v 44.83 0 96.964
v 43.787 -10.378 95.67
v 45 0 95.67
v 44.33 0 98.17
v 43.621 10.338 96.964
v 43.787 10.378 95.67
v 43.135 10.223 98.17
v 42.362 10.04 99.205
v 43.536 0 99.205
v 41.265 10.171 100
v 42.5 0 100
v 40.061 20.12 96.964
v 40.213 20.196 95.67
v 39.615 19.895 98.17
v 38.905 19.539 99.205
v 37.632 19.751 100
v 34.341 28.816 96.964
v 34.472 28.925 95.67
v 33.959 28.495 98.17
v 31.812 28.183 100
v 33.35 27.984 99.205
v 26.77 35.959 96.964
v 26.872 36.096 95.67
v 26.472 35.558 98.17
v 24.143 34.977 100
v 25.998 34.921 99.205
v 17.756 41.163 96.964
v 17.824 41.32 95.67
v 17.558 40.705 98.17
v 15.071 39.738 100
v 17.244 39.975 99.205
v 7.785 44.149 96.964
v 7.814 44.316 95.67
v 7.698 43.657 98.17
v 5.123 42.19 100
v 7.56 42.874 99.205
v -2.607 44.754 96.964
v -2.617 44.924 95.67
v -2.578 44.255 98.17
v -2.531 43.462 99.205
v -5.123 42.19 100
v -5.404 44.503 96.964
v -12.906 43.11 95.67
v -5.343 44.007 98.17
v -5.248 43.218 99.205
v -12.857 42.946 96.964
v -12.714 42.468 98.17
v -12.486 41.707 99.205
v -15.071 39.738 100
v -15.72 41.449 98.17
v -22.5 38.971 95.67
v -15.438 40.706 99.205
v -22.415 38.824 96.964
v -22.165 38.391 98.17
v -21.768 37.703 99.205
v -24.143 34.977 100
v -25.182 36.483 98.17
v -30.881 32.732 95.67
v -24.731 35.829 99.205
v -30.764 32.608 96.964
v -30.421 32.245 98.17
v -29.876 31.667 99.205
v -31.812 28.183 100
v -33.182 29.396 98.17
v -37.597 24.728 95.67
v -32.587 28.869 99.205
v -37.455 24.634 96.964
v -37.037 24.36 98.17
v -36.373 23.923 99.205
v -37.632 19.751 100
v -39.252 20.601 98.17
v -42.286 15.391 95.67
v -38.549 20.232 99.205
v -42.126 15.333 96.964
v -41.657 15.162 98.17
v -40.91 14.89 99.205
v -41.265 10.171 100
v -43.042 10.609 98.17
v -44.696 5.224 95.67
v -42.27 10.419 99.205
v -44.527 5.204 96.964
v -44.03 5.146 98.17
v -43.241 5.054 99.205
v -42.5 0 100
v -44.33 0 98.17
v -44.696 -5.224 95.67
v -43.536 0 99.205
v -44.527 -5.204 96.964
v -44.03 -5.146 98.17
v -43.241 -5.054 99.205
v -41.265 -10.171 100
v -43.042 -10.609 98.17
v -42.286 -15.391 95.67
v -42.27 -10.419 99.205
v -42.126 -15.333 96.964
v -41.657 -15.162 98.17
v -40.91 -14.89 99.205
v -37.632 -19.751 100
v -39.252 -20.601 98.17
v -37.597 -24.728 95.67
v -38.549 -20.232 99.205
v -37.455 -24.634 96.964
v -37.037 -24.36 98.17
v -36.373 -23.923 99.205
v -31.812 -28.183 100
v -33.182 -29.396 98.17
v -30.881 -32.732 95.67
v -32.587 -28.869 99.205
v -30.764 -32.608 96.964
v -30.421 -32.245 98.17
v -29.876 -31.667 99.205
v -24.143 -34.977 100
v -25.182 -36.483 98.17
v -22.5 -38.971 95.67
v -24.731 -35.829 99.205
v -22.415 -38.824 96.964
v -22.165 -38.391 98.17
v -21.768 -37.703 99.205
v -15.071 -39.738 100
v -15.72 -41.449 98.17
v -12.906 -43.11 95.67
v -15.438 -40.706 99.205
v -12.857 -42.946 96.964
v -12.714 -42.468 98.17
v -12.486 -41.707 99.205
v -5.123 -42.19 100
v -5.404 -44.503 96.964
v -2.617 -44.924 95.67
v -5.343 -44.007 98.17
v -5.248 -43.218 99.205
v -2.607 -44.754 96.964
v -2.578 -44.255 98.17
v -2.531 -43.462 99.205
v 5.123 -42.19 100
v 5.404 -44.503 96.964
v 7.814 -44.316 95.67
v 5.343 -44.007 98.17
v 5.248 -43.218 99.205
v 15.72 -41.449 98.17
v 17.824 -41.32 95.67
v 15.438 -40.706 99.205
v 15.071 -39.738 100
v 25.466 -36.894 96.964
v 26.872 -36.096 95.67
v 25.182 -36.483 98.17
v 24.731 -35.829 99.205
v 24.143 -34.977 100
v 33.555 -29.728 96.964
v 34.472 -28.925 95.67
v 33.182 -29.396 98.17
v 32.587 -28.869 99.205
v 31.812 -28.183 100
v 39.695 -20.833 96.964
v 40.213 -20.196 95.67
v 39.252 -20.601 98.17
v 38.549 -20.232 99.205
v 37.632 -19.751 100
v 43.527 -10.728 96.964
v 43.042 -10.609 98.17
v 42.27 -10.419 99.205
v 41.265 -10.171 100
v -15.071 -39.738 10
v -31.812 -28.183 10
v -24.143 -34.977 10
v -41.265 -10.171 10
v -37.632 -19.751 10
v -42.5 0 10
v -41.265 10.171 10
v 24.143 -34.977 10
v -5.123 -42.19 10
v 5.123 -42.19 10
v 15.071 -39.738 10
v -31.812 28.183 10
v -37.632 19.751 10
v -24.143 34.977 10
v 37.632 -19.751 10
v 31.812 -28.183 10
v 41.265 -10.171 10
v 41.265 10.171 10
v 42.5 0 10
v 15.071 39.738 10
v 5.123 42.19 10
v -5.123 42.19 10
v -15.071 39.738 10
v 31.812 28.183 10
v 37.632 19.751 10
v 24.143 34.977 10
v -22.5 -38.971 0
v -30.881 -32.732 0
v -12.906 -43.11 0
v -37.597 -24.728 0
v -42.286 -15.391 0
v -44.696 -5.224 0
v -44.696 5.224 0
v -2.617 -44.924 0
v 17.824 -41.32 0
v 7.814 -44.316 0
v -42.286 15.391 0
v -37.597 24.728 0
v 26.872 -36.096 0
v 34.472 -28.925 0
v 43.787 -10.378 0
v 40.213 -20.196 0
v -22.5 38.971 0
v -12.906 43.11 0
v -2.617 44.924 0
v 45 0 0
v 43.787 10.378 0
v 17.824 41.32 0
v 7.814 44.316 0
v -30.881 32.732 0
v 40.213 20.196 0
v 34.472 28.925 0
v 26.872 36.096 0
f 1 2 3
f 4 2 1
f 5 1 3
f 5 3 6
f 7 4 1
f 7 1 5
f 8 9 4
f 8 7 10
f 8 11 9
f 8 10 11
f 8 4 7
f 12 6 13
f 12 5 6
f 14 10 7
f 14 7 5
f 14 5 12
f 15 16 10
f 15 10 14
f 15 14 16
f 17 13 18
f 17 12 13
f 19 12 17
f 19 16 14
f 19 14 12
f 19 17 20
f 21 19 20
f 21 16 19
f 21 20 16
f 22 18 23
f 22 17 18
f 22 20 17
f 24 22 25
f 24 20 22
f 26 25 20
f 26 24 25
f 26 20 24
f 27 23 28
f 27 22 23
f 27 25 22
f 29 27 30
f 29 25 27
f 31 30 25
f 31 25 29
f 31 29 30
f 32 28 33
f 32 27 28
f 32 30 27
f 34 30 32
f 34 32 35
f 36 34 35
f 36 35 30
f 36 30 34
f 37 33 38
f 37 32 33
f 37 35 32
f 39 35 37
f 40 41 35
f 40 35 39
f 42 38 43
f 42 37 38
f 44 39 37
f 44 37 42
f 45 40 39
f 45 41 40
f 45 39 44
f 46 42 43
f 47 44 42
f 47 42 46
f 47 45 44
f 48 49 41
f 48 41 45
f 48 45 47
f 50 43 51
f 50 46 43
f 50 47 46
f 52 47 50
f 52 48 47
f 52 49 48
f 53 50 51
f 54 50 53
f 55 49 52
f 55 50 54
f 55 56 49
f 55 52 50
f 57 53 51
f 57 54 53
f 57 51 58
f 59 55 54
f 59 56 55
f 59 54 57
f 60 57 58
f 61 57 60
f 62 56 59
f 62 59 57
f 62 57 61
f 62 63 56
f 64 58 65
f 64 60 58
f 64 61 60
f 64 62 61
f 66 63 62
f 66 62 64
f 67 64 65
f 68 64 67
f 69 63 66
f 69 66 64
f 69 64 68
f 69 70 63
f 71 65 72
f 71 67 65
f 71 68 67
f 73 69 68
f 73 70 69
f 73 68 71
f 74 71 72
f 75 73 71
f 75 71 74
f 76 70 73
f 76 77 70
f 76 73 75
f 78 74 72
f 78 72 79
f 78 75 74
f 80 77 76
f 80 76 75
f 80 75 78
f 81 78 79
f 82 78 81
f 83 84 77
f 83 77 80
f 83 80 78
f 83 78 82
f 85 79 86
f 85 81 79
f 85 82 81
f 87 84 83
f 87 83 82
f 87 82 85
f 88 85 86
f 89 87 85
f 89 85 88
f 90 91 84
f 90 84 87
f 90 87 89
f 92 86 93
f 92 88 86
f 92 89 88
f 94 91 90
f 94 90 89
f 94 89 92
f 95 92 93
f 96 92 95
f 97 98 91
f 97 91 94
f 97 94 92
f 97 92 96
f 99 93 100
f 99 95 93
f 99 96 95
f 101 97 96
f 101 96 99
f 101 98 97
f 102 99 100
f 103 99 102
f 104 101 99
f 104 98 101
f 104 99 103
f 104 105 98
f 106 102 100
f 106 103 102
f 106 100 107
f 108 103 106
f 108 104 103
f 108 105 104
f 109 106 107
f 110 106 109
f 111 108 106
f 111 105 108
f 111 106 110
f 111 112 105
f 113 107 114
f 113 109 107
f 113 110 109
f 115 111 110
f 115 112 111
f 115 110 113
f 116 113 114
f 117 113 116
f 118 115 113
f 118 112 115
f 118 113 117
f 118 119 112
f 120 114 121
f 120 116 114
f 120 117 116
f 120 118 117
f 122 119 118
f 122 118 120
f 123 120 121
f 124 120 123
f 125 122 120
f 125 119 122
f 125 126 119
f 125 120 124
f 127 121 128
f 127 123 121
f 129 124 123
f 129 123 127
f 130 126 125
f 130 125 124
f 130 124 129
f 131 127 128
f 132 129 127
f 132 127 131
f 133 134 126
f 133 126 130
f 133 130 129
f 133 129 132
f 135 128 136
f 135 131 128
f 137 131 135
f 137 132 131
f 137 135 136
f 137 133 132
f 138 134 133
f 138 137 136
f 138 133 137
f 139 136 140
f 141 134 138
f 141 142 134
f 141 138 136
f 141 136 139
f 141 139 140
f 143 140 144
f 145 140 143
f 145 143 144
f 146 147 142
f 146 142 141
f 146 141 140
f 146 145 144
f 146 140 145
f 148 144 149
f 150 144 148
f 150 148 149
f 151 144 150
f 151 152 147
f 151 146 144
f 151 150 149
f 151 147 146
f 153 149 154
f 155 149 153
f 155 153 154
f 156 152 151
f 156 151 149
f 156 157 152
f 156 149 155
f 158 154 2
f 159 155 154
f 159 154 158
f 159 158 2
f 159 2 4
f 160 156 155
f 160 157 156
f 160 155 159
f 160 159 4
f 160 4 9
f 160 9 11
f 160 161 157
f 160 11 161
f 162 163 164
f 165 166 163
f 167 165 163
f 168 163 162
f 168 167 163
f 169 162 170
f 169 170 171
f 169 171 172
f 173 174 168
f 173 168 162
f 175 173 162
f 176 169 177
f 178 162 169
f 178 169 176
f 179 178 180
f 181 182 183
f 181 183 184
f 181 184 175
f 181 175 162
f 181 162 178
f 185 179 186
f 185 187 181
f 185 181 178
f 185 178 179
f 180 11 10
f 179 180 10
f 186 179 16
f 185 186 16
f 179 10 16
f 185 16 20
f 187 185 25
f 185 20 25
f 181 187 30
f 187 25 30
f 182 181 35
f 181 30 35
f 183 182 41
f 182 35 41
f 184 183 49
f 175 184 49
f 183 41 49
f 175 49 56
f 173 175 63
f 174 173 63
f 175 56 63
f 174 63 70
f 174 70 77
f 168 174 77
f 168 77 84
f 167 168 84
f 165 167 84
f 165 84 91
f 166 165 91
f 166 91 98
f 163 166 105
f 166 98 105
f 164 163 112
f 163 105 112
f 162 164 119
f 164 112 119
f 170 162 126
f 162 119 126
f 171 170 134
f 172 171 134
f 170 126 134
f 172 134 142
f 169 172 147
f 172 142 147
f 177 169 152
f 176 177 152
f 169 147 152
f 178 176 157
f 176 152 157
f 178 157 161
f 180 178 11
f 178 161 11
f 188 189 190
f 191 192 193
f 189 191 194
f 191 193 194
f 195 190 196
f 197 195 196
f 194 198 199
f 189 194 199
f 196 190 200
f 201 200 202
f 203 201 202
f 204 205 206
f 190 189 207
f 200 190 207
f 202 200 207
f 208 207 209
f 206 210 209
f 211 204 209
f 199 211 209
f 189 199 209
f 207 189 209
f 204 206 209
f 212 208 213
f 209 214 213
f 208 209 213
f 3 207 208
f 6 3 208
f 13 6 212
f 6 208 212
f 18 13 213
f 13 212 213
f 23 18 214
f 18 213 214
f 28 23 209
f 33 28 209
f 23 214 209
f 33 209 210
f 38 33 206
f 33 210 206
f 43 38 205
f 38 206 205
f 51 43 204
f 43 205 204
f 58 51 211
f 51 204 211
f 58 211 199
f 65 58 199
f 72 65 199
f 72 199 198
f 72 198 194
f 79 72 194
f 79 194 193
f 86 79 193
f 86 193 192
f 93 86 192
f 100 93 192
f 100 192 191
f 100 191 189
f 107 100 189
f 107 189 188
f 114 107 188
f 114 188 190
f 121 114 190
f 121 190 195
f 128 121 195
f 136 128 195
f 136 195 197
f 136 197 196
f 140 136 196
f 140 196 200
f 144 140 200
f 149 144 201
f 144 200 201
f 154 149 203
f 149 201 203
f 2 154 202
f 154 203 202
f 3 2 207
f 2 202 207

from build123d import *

# Parameters (mm, degrees)
F0_R     = 45
F1_DEPTH = 100
F3_R     = 42.5
F4_DEPTH = 90


# Not quite as in the source:
# - a fillet or chamfer that OpenCascade refuses, or shapes differently, is made with other operations: its cross-section is extruded or revolved along the edge and cut away or added


with BuildPart() as f1:
    # F0 (on Top) → F1 (new body)
    with BuildSketch(Plane.XY):
        Circle(F0_R)
    extrude(amount=F1_DEPTH)

    # F3 (on face) → F4 (cut)
    with BuildSketch(Plane.XY.offset(100)):
        Circle(F3_R)
    extrude(amount=-F4_DEPTH, mode=Mode.SUBTRACT)

    # F5: fillet of radius 5 on 1 edges, made by hand

    # F5_s1 → F5_t2 (revolve, cut)
    with BuildSketch(Plane.XZ):
        with BuildLine():
            ThreePointArc((45, 95.6698729811), (44.3301270189, 98.1698729811), (42.5, 100))
            Line((42.5, 100), (45, 100))
            Line((45, 100), (45, 95.6698729811))
        make_face()
    revolve(axis=Axis((0, 0, 100), (0, 0, 1)), mode=Mode.SUBTRACT)


solid = f1.part
